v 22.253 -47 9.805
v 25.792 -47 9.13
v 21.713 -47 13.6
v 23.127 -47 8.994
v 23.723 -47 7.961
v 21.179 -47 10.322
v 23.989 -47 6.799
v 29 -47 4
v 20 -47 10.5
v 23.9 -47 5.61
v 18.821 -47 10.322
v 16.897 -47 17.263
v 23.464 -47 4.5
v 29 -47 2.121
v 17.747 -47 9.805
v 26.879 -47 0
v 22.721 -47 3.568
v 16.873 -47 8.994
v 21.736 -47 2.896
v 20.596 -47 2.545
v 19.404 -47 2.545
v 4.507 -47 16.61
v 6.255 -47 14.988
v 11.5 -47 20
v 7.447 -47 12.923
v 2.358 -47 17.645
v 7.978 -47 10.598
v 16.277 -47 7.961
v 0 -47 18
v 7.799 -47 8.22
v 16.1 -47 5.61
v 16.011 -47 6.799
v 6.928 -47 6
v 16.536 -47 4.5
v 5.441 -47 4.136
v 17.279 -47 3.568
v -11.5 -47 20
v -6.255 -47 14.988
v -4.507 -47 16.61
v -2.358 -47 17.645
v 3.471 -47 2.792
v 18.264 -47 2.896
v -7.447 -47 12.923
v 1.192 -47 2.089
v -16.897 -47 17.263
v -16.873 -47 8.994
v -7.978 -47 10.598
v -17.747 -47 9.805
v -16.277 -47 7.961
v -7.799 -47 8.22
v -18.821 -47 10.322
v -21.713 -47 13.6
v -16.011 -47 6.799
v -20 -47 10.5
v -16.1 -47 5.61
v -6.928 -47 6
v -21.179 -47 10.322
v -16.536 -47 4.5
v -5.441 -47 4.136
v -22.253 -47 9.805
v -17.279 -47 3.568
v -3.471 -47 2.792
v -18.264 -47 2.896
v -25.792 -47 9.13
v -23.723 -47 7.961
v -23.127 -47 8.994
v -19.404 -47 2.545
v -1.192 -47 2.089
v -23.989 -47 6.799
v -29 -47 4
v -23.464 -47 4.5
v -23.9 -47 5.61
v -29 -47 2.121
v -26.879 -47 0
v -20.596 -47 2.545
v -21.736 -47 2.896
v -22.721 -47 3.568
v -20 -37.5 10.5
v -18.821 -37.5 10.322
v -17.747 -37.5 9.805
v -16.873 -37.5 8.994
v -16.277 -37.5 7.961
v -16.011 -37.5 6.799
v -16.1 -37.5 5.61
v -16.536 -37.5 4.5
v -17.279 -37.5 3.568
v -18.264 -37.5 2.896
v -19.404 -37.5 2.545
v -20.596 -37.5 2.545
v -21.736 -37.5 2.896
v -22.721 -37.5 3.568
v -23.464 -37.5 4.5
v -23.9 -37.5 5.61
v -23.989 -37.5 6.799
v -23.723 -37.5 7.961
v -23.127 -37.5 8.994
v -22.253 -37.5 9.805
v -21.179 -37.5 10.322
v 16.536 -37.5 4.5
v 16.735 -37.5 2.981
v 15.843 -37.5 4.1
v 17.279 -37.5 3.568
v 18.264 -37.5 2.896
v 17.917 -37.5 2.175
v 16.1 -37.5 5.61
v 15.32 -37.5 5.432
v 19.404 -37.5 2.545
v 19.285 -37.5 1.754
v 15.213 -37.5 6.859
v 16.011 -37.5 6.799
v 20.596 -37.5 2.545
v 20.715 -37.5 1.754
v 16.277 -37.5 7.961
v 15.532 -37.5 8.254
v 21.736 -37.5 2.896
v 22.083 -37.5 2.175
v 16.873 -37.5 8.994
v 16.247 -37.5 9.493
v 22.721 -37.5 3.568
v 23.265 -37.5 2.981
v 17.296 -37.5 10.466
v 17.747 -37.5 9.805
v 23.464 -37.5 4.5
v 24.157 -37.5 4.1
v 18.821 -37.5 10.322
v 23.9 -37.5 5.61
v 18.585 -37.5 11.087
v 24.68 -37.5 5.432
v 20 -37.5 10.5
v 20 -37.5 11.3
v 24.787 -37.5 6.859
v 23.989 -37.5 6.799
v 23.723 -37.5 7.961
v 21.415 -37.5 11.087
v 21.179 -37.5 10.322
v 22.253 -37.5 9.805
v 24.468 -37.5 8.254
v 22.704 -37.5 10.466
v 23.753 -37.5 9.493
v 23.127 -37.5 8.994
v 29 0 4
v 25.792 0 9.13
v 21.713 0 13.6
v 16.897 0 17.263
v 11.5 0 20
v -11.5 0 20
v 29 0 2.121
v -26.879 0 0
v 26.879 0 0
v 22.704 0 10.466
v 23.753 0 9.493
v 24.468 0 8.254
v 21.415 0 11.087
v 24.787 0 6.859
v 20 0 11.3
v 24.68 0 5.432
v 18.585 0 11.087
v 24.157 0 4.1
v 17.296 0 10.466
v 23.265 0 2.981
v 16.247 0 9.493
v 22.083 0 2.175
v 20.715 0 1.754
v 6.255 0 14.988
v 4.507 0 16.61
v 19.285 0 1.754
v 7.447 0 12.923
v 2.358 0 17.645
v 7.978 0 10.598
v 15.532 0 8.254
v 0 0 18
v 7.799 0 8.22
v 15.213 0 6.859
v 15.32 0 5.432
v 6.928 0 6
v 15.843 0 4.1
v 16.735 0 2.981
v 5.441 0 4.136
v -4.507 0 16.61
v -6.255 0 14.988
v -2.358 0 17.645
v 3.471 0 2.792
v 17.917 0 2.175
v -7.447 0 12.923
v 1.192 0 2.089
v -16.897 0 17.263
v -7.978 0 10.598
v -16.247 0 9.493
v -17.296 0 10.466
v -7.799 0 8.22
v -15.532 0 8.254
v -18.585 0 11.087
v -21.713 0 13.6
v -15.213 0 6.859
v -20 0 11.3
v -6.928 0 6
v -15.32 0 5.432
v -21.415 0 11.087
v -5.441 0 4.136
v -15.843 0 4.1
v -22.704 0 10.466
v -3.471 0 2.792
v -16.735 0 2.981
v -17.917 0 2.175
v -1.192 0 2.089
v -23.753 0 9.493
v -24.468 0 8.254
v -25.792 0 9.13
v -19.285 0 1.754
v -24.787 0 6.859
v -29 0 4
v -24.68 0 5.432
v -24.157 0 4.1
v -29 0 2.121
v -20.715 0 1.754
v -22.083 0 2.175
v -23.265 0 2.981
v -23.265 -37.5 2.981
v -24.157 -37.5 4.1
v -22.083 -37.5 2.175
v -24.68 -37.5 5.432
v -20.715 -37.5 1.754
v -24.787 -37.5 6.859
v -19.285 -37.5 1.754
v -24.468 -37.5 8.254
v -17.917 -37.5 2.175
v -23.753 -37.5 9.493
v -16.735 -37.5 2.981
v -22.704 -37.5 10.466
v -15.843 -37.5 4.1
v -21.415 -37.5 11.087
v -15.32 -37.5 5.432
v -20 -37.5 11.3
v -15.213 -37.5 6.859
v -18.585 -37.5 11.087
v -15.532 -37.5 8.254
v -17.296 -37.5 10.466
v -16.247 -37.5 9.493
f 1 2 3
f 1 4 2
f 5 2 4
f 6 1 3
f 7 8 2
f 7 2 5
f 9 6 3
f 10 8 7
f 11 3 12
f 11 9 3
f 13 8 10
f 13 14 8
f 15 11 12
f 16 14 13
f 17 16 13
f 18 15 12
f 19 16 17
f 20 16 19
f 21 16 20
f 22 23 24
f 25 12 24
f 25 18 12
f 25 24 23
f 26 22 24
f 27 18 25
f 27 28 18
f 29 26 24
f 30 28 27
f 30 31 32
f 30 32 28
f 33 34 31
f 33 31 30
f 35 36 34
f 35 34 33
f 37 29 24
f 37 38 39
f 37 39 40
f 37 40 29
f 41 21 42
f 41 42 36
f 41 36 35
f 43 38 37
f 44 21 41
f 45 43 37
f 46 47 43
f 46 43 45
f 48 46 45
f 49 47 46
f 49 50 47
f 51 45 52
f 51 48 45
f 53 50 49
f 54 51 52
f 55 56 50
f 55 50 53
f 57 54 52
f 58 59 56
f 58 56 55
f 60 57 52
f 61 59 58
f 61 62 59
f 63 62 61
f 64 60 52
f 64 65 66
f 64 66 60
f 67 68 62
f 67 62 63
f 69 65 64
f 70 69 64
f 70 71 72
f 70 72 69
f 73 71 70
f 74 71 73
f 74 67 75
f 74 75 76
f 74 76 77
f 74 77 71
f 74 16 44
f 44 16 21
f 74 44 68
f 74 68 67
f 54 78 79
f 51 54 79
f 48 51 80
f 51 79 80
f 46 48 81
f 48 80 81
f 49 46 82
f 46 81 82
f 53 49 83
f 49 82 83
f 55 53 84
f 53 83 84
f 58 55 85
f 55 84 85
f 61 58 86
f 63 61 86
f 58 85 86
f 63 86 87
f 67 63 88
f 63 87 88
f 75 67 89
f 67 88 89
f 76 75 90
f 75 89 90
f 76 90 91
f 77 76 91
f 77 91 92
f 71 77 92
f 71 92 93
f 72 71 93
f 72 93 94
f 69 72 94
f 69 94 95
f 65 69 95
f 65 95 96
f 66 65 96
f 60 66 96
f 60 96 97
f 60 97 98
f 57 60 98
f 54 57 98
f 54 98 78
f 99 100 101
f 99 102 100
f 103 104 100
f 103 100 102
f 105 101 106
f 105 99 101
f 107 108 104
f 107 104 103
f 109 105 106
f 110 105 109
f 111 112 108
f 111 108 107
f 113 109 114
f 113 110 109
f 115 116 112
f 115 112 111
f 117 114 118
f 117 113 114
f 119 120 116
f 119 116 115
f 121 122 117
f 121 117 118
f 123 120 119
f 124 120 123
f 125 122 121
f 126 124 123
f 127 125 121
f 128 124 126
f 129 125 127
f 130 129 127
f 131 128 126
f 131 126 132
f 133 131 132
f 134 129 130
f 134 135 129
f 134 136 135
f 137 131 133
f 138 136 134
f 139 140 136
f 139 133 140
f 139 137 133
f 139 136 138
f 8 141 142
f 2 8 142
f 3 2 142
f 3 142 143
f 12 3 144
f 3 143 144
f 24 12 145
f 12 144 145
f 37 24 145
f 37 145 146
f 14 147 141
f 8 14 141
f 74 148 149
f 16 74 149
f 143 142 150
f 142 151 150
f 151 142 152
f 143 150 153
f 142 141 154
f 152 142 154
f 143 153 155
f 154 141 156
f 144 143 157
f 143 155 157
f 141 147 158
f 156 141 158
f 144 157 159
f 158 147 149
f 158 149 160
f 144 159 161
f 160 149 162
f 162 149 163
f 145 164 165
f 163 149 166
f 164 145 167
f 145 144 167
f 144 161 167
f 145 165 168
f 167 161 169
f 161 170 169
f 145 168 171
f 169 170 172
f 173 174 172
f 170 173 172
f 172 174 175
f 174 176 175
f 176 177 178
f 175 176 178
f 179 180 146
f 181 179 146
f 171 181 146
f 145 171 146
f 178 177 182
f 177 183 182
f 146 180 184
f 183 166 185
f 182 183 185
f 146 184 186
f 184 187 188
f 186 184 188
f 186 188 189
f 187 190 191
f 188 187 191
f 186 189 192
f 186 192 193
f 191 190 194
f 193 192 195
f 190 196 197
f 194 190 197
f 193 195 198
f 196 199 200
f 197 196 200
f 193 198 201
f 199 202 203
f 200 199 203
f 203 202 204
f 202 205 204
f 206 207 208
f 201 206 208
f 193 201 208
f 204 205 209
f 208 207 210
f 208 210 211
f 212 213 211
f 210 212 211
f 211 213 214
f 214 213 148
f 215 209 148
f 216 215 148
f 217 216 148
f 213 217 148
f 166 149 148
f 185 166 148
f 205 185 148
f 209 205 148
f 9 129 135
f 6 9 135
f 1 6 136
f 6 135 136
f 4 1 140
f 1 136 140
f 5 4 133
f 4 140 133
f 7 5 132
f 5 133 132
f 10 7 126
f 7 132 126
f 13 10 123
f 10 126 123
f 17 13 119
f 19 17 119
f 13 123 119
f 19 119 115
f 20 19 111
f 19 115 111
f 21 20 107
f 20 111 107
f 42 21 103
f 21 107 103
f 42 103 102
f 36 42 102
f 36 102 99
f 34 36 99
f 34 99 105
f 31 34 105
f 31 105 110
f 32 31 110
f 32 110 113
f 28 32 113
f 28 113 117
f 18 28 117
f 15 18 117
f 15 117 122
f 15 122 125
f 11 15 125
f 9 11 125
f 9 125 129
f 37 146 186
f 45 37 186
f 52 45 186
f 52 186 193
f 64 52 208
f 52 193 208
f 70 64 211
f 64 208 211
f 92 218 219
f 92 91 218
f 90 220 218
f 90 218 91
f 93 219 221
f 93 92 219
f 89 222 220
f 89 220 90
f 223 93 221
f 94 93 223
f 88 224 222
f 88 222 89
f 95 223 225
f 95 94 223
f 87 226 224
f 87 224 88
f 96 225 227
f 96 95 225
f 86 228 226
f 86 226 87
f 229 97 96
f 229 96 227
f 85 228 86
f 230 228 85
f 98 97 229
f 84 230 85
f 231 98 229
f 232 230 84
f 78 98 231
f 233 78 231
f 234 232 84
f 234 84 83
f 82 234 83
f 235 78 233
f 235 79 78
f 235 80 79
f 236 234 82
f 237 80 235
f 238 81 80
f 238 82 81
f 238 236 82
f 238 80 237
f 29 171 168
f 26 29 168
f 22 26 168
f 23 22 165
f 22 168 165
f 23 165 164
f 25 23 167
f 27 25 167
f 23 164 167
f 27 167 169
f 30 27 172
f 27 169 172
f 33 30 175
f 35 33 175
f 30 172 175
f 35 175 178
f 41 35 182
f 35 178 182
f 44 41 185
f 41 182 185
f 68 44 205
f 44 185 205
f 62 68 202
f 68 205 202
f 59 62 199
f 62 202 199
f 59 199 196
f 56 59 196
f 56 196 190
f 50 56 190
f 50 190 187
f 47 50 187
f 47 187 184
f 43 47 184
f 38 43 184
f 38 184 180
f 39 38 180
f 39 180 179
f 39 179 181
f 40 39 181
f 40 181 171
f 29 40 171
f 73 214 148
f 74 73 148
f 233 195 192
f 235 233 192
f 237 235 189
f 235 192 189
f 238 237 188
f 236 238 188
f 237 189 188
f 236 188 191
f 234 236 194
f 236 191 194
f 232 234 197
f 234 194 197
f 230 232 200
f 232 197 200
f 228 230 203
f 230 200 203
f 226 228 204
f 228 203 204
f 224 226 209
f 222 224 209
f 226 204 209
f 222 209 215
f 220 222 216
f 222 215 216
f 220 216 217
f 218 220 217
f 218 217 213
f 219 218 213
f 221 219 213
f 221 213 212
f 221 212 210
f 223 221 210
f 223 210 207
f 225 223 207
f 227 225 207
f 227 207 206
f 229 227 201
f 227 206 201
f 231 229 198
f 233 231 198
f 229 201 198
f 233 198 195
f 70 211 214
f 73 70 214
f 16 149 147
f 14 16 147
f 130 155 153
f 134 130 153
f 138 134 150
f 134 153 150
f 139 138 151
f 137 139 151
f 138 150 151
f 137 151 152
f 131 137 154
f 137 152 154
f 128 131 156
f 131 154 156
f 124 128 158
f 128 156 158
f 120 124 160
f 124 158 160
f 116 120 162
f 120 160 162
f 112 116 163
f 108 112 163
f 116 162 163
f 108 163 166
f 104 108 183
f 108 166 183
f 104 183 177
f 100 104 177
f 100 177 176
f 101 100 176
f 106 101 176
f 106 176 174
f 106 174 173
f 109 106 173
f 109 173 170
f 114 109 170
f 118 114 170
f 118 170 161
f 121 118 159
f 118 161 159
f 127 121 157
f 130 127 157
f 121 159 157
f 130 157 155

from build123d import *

# Parameters (mm, degrees)
BOSS_EXTRUDE1_DEPTH = 47
SKETCH2_R           = 4
SKETCH2_R_2         = 8
CUT_EXTRUDE1_DEPTH  = 59.736700622
SKETCH3_R           = 4.8
CUT_EXTRUDE2_DEPTH  = 37.5


with BuildPart() as part:
    # Sketch1 → Boss-Extrude1 (new body)
    with BuildSketch(Plane(origin=(0, 0, 0), x_dir=(1, 0, 0), z_dir=(0, 1, 0))):
        with BuildLine():
            Line((-26.878679656, 0), (26.878679656, 0))
            Line((26.878679656, 0), (29, -2.121320344))
            Line((29, -2.121320344), (29, -4))
            ThreePointArc((29, -4), (21.712972029, -13.600125657), (11.5, -20))
            Line((11.5, -20), (-11.5, -20))
            ThreePointArc((-11.5, -20), (-21.712972029, -13.600125657), (-29, -4))
            Line((-29, -4), (-29, -2.121320344))
            Line((-29, -2.121320344), (-26.878679656, 0))
        make_face()
    extrude(amount=-BOSS_EXTRUDE1_DEPTH)

    # Sketch2 → Cut-Extrude1 (cut, through all)
    with BuildSketch(Plane(origin=(0, 0, 0), x_dir=(1, 0, 0), z_dir=(0, 1, 0))):
        with Locations(Location((-20, -6.5, 0), (0, 0, 270))):
            Circle(SKETCH2_R)
        with Locations(Location((0, -10, 0), (0, 0, 270))):
            Circle(SKETCH2_R_2)
        with Locations(Location((20, -6.5, 0), (0, 0, 270))):
            Circle(SKETCH2_R)
    extrude(amount=-CUT_EXTRUDE1_DEPTH, mode=Mode.SUBTRACT)

    # Sketch3 → Cut-Extrude2 (cut)
    with BuildSketch(Plane(origin=(0, 0, 0), x_dir=(1, 0, 0), z_dir=(0, 1, 0))):
        with Locations(Location((-20, -6.5, 0), (0, 0, 270))):
            Circle(SKETCH3_R)
        with Locations(Location((20, -6.5, 0), (0, 0, 270))):
            Circle(SKETCH3_R)
    extrude(amount=-CUT_EXTRUDE2_DEPTH, mode=Mode.SUBTRACT)


solid = part.part
